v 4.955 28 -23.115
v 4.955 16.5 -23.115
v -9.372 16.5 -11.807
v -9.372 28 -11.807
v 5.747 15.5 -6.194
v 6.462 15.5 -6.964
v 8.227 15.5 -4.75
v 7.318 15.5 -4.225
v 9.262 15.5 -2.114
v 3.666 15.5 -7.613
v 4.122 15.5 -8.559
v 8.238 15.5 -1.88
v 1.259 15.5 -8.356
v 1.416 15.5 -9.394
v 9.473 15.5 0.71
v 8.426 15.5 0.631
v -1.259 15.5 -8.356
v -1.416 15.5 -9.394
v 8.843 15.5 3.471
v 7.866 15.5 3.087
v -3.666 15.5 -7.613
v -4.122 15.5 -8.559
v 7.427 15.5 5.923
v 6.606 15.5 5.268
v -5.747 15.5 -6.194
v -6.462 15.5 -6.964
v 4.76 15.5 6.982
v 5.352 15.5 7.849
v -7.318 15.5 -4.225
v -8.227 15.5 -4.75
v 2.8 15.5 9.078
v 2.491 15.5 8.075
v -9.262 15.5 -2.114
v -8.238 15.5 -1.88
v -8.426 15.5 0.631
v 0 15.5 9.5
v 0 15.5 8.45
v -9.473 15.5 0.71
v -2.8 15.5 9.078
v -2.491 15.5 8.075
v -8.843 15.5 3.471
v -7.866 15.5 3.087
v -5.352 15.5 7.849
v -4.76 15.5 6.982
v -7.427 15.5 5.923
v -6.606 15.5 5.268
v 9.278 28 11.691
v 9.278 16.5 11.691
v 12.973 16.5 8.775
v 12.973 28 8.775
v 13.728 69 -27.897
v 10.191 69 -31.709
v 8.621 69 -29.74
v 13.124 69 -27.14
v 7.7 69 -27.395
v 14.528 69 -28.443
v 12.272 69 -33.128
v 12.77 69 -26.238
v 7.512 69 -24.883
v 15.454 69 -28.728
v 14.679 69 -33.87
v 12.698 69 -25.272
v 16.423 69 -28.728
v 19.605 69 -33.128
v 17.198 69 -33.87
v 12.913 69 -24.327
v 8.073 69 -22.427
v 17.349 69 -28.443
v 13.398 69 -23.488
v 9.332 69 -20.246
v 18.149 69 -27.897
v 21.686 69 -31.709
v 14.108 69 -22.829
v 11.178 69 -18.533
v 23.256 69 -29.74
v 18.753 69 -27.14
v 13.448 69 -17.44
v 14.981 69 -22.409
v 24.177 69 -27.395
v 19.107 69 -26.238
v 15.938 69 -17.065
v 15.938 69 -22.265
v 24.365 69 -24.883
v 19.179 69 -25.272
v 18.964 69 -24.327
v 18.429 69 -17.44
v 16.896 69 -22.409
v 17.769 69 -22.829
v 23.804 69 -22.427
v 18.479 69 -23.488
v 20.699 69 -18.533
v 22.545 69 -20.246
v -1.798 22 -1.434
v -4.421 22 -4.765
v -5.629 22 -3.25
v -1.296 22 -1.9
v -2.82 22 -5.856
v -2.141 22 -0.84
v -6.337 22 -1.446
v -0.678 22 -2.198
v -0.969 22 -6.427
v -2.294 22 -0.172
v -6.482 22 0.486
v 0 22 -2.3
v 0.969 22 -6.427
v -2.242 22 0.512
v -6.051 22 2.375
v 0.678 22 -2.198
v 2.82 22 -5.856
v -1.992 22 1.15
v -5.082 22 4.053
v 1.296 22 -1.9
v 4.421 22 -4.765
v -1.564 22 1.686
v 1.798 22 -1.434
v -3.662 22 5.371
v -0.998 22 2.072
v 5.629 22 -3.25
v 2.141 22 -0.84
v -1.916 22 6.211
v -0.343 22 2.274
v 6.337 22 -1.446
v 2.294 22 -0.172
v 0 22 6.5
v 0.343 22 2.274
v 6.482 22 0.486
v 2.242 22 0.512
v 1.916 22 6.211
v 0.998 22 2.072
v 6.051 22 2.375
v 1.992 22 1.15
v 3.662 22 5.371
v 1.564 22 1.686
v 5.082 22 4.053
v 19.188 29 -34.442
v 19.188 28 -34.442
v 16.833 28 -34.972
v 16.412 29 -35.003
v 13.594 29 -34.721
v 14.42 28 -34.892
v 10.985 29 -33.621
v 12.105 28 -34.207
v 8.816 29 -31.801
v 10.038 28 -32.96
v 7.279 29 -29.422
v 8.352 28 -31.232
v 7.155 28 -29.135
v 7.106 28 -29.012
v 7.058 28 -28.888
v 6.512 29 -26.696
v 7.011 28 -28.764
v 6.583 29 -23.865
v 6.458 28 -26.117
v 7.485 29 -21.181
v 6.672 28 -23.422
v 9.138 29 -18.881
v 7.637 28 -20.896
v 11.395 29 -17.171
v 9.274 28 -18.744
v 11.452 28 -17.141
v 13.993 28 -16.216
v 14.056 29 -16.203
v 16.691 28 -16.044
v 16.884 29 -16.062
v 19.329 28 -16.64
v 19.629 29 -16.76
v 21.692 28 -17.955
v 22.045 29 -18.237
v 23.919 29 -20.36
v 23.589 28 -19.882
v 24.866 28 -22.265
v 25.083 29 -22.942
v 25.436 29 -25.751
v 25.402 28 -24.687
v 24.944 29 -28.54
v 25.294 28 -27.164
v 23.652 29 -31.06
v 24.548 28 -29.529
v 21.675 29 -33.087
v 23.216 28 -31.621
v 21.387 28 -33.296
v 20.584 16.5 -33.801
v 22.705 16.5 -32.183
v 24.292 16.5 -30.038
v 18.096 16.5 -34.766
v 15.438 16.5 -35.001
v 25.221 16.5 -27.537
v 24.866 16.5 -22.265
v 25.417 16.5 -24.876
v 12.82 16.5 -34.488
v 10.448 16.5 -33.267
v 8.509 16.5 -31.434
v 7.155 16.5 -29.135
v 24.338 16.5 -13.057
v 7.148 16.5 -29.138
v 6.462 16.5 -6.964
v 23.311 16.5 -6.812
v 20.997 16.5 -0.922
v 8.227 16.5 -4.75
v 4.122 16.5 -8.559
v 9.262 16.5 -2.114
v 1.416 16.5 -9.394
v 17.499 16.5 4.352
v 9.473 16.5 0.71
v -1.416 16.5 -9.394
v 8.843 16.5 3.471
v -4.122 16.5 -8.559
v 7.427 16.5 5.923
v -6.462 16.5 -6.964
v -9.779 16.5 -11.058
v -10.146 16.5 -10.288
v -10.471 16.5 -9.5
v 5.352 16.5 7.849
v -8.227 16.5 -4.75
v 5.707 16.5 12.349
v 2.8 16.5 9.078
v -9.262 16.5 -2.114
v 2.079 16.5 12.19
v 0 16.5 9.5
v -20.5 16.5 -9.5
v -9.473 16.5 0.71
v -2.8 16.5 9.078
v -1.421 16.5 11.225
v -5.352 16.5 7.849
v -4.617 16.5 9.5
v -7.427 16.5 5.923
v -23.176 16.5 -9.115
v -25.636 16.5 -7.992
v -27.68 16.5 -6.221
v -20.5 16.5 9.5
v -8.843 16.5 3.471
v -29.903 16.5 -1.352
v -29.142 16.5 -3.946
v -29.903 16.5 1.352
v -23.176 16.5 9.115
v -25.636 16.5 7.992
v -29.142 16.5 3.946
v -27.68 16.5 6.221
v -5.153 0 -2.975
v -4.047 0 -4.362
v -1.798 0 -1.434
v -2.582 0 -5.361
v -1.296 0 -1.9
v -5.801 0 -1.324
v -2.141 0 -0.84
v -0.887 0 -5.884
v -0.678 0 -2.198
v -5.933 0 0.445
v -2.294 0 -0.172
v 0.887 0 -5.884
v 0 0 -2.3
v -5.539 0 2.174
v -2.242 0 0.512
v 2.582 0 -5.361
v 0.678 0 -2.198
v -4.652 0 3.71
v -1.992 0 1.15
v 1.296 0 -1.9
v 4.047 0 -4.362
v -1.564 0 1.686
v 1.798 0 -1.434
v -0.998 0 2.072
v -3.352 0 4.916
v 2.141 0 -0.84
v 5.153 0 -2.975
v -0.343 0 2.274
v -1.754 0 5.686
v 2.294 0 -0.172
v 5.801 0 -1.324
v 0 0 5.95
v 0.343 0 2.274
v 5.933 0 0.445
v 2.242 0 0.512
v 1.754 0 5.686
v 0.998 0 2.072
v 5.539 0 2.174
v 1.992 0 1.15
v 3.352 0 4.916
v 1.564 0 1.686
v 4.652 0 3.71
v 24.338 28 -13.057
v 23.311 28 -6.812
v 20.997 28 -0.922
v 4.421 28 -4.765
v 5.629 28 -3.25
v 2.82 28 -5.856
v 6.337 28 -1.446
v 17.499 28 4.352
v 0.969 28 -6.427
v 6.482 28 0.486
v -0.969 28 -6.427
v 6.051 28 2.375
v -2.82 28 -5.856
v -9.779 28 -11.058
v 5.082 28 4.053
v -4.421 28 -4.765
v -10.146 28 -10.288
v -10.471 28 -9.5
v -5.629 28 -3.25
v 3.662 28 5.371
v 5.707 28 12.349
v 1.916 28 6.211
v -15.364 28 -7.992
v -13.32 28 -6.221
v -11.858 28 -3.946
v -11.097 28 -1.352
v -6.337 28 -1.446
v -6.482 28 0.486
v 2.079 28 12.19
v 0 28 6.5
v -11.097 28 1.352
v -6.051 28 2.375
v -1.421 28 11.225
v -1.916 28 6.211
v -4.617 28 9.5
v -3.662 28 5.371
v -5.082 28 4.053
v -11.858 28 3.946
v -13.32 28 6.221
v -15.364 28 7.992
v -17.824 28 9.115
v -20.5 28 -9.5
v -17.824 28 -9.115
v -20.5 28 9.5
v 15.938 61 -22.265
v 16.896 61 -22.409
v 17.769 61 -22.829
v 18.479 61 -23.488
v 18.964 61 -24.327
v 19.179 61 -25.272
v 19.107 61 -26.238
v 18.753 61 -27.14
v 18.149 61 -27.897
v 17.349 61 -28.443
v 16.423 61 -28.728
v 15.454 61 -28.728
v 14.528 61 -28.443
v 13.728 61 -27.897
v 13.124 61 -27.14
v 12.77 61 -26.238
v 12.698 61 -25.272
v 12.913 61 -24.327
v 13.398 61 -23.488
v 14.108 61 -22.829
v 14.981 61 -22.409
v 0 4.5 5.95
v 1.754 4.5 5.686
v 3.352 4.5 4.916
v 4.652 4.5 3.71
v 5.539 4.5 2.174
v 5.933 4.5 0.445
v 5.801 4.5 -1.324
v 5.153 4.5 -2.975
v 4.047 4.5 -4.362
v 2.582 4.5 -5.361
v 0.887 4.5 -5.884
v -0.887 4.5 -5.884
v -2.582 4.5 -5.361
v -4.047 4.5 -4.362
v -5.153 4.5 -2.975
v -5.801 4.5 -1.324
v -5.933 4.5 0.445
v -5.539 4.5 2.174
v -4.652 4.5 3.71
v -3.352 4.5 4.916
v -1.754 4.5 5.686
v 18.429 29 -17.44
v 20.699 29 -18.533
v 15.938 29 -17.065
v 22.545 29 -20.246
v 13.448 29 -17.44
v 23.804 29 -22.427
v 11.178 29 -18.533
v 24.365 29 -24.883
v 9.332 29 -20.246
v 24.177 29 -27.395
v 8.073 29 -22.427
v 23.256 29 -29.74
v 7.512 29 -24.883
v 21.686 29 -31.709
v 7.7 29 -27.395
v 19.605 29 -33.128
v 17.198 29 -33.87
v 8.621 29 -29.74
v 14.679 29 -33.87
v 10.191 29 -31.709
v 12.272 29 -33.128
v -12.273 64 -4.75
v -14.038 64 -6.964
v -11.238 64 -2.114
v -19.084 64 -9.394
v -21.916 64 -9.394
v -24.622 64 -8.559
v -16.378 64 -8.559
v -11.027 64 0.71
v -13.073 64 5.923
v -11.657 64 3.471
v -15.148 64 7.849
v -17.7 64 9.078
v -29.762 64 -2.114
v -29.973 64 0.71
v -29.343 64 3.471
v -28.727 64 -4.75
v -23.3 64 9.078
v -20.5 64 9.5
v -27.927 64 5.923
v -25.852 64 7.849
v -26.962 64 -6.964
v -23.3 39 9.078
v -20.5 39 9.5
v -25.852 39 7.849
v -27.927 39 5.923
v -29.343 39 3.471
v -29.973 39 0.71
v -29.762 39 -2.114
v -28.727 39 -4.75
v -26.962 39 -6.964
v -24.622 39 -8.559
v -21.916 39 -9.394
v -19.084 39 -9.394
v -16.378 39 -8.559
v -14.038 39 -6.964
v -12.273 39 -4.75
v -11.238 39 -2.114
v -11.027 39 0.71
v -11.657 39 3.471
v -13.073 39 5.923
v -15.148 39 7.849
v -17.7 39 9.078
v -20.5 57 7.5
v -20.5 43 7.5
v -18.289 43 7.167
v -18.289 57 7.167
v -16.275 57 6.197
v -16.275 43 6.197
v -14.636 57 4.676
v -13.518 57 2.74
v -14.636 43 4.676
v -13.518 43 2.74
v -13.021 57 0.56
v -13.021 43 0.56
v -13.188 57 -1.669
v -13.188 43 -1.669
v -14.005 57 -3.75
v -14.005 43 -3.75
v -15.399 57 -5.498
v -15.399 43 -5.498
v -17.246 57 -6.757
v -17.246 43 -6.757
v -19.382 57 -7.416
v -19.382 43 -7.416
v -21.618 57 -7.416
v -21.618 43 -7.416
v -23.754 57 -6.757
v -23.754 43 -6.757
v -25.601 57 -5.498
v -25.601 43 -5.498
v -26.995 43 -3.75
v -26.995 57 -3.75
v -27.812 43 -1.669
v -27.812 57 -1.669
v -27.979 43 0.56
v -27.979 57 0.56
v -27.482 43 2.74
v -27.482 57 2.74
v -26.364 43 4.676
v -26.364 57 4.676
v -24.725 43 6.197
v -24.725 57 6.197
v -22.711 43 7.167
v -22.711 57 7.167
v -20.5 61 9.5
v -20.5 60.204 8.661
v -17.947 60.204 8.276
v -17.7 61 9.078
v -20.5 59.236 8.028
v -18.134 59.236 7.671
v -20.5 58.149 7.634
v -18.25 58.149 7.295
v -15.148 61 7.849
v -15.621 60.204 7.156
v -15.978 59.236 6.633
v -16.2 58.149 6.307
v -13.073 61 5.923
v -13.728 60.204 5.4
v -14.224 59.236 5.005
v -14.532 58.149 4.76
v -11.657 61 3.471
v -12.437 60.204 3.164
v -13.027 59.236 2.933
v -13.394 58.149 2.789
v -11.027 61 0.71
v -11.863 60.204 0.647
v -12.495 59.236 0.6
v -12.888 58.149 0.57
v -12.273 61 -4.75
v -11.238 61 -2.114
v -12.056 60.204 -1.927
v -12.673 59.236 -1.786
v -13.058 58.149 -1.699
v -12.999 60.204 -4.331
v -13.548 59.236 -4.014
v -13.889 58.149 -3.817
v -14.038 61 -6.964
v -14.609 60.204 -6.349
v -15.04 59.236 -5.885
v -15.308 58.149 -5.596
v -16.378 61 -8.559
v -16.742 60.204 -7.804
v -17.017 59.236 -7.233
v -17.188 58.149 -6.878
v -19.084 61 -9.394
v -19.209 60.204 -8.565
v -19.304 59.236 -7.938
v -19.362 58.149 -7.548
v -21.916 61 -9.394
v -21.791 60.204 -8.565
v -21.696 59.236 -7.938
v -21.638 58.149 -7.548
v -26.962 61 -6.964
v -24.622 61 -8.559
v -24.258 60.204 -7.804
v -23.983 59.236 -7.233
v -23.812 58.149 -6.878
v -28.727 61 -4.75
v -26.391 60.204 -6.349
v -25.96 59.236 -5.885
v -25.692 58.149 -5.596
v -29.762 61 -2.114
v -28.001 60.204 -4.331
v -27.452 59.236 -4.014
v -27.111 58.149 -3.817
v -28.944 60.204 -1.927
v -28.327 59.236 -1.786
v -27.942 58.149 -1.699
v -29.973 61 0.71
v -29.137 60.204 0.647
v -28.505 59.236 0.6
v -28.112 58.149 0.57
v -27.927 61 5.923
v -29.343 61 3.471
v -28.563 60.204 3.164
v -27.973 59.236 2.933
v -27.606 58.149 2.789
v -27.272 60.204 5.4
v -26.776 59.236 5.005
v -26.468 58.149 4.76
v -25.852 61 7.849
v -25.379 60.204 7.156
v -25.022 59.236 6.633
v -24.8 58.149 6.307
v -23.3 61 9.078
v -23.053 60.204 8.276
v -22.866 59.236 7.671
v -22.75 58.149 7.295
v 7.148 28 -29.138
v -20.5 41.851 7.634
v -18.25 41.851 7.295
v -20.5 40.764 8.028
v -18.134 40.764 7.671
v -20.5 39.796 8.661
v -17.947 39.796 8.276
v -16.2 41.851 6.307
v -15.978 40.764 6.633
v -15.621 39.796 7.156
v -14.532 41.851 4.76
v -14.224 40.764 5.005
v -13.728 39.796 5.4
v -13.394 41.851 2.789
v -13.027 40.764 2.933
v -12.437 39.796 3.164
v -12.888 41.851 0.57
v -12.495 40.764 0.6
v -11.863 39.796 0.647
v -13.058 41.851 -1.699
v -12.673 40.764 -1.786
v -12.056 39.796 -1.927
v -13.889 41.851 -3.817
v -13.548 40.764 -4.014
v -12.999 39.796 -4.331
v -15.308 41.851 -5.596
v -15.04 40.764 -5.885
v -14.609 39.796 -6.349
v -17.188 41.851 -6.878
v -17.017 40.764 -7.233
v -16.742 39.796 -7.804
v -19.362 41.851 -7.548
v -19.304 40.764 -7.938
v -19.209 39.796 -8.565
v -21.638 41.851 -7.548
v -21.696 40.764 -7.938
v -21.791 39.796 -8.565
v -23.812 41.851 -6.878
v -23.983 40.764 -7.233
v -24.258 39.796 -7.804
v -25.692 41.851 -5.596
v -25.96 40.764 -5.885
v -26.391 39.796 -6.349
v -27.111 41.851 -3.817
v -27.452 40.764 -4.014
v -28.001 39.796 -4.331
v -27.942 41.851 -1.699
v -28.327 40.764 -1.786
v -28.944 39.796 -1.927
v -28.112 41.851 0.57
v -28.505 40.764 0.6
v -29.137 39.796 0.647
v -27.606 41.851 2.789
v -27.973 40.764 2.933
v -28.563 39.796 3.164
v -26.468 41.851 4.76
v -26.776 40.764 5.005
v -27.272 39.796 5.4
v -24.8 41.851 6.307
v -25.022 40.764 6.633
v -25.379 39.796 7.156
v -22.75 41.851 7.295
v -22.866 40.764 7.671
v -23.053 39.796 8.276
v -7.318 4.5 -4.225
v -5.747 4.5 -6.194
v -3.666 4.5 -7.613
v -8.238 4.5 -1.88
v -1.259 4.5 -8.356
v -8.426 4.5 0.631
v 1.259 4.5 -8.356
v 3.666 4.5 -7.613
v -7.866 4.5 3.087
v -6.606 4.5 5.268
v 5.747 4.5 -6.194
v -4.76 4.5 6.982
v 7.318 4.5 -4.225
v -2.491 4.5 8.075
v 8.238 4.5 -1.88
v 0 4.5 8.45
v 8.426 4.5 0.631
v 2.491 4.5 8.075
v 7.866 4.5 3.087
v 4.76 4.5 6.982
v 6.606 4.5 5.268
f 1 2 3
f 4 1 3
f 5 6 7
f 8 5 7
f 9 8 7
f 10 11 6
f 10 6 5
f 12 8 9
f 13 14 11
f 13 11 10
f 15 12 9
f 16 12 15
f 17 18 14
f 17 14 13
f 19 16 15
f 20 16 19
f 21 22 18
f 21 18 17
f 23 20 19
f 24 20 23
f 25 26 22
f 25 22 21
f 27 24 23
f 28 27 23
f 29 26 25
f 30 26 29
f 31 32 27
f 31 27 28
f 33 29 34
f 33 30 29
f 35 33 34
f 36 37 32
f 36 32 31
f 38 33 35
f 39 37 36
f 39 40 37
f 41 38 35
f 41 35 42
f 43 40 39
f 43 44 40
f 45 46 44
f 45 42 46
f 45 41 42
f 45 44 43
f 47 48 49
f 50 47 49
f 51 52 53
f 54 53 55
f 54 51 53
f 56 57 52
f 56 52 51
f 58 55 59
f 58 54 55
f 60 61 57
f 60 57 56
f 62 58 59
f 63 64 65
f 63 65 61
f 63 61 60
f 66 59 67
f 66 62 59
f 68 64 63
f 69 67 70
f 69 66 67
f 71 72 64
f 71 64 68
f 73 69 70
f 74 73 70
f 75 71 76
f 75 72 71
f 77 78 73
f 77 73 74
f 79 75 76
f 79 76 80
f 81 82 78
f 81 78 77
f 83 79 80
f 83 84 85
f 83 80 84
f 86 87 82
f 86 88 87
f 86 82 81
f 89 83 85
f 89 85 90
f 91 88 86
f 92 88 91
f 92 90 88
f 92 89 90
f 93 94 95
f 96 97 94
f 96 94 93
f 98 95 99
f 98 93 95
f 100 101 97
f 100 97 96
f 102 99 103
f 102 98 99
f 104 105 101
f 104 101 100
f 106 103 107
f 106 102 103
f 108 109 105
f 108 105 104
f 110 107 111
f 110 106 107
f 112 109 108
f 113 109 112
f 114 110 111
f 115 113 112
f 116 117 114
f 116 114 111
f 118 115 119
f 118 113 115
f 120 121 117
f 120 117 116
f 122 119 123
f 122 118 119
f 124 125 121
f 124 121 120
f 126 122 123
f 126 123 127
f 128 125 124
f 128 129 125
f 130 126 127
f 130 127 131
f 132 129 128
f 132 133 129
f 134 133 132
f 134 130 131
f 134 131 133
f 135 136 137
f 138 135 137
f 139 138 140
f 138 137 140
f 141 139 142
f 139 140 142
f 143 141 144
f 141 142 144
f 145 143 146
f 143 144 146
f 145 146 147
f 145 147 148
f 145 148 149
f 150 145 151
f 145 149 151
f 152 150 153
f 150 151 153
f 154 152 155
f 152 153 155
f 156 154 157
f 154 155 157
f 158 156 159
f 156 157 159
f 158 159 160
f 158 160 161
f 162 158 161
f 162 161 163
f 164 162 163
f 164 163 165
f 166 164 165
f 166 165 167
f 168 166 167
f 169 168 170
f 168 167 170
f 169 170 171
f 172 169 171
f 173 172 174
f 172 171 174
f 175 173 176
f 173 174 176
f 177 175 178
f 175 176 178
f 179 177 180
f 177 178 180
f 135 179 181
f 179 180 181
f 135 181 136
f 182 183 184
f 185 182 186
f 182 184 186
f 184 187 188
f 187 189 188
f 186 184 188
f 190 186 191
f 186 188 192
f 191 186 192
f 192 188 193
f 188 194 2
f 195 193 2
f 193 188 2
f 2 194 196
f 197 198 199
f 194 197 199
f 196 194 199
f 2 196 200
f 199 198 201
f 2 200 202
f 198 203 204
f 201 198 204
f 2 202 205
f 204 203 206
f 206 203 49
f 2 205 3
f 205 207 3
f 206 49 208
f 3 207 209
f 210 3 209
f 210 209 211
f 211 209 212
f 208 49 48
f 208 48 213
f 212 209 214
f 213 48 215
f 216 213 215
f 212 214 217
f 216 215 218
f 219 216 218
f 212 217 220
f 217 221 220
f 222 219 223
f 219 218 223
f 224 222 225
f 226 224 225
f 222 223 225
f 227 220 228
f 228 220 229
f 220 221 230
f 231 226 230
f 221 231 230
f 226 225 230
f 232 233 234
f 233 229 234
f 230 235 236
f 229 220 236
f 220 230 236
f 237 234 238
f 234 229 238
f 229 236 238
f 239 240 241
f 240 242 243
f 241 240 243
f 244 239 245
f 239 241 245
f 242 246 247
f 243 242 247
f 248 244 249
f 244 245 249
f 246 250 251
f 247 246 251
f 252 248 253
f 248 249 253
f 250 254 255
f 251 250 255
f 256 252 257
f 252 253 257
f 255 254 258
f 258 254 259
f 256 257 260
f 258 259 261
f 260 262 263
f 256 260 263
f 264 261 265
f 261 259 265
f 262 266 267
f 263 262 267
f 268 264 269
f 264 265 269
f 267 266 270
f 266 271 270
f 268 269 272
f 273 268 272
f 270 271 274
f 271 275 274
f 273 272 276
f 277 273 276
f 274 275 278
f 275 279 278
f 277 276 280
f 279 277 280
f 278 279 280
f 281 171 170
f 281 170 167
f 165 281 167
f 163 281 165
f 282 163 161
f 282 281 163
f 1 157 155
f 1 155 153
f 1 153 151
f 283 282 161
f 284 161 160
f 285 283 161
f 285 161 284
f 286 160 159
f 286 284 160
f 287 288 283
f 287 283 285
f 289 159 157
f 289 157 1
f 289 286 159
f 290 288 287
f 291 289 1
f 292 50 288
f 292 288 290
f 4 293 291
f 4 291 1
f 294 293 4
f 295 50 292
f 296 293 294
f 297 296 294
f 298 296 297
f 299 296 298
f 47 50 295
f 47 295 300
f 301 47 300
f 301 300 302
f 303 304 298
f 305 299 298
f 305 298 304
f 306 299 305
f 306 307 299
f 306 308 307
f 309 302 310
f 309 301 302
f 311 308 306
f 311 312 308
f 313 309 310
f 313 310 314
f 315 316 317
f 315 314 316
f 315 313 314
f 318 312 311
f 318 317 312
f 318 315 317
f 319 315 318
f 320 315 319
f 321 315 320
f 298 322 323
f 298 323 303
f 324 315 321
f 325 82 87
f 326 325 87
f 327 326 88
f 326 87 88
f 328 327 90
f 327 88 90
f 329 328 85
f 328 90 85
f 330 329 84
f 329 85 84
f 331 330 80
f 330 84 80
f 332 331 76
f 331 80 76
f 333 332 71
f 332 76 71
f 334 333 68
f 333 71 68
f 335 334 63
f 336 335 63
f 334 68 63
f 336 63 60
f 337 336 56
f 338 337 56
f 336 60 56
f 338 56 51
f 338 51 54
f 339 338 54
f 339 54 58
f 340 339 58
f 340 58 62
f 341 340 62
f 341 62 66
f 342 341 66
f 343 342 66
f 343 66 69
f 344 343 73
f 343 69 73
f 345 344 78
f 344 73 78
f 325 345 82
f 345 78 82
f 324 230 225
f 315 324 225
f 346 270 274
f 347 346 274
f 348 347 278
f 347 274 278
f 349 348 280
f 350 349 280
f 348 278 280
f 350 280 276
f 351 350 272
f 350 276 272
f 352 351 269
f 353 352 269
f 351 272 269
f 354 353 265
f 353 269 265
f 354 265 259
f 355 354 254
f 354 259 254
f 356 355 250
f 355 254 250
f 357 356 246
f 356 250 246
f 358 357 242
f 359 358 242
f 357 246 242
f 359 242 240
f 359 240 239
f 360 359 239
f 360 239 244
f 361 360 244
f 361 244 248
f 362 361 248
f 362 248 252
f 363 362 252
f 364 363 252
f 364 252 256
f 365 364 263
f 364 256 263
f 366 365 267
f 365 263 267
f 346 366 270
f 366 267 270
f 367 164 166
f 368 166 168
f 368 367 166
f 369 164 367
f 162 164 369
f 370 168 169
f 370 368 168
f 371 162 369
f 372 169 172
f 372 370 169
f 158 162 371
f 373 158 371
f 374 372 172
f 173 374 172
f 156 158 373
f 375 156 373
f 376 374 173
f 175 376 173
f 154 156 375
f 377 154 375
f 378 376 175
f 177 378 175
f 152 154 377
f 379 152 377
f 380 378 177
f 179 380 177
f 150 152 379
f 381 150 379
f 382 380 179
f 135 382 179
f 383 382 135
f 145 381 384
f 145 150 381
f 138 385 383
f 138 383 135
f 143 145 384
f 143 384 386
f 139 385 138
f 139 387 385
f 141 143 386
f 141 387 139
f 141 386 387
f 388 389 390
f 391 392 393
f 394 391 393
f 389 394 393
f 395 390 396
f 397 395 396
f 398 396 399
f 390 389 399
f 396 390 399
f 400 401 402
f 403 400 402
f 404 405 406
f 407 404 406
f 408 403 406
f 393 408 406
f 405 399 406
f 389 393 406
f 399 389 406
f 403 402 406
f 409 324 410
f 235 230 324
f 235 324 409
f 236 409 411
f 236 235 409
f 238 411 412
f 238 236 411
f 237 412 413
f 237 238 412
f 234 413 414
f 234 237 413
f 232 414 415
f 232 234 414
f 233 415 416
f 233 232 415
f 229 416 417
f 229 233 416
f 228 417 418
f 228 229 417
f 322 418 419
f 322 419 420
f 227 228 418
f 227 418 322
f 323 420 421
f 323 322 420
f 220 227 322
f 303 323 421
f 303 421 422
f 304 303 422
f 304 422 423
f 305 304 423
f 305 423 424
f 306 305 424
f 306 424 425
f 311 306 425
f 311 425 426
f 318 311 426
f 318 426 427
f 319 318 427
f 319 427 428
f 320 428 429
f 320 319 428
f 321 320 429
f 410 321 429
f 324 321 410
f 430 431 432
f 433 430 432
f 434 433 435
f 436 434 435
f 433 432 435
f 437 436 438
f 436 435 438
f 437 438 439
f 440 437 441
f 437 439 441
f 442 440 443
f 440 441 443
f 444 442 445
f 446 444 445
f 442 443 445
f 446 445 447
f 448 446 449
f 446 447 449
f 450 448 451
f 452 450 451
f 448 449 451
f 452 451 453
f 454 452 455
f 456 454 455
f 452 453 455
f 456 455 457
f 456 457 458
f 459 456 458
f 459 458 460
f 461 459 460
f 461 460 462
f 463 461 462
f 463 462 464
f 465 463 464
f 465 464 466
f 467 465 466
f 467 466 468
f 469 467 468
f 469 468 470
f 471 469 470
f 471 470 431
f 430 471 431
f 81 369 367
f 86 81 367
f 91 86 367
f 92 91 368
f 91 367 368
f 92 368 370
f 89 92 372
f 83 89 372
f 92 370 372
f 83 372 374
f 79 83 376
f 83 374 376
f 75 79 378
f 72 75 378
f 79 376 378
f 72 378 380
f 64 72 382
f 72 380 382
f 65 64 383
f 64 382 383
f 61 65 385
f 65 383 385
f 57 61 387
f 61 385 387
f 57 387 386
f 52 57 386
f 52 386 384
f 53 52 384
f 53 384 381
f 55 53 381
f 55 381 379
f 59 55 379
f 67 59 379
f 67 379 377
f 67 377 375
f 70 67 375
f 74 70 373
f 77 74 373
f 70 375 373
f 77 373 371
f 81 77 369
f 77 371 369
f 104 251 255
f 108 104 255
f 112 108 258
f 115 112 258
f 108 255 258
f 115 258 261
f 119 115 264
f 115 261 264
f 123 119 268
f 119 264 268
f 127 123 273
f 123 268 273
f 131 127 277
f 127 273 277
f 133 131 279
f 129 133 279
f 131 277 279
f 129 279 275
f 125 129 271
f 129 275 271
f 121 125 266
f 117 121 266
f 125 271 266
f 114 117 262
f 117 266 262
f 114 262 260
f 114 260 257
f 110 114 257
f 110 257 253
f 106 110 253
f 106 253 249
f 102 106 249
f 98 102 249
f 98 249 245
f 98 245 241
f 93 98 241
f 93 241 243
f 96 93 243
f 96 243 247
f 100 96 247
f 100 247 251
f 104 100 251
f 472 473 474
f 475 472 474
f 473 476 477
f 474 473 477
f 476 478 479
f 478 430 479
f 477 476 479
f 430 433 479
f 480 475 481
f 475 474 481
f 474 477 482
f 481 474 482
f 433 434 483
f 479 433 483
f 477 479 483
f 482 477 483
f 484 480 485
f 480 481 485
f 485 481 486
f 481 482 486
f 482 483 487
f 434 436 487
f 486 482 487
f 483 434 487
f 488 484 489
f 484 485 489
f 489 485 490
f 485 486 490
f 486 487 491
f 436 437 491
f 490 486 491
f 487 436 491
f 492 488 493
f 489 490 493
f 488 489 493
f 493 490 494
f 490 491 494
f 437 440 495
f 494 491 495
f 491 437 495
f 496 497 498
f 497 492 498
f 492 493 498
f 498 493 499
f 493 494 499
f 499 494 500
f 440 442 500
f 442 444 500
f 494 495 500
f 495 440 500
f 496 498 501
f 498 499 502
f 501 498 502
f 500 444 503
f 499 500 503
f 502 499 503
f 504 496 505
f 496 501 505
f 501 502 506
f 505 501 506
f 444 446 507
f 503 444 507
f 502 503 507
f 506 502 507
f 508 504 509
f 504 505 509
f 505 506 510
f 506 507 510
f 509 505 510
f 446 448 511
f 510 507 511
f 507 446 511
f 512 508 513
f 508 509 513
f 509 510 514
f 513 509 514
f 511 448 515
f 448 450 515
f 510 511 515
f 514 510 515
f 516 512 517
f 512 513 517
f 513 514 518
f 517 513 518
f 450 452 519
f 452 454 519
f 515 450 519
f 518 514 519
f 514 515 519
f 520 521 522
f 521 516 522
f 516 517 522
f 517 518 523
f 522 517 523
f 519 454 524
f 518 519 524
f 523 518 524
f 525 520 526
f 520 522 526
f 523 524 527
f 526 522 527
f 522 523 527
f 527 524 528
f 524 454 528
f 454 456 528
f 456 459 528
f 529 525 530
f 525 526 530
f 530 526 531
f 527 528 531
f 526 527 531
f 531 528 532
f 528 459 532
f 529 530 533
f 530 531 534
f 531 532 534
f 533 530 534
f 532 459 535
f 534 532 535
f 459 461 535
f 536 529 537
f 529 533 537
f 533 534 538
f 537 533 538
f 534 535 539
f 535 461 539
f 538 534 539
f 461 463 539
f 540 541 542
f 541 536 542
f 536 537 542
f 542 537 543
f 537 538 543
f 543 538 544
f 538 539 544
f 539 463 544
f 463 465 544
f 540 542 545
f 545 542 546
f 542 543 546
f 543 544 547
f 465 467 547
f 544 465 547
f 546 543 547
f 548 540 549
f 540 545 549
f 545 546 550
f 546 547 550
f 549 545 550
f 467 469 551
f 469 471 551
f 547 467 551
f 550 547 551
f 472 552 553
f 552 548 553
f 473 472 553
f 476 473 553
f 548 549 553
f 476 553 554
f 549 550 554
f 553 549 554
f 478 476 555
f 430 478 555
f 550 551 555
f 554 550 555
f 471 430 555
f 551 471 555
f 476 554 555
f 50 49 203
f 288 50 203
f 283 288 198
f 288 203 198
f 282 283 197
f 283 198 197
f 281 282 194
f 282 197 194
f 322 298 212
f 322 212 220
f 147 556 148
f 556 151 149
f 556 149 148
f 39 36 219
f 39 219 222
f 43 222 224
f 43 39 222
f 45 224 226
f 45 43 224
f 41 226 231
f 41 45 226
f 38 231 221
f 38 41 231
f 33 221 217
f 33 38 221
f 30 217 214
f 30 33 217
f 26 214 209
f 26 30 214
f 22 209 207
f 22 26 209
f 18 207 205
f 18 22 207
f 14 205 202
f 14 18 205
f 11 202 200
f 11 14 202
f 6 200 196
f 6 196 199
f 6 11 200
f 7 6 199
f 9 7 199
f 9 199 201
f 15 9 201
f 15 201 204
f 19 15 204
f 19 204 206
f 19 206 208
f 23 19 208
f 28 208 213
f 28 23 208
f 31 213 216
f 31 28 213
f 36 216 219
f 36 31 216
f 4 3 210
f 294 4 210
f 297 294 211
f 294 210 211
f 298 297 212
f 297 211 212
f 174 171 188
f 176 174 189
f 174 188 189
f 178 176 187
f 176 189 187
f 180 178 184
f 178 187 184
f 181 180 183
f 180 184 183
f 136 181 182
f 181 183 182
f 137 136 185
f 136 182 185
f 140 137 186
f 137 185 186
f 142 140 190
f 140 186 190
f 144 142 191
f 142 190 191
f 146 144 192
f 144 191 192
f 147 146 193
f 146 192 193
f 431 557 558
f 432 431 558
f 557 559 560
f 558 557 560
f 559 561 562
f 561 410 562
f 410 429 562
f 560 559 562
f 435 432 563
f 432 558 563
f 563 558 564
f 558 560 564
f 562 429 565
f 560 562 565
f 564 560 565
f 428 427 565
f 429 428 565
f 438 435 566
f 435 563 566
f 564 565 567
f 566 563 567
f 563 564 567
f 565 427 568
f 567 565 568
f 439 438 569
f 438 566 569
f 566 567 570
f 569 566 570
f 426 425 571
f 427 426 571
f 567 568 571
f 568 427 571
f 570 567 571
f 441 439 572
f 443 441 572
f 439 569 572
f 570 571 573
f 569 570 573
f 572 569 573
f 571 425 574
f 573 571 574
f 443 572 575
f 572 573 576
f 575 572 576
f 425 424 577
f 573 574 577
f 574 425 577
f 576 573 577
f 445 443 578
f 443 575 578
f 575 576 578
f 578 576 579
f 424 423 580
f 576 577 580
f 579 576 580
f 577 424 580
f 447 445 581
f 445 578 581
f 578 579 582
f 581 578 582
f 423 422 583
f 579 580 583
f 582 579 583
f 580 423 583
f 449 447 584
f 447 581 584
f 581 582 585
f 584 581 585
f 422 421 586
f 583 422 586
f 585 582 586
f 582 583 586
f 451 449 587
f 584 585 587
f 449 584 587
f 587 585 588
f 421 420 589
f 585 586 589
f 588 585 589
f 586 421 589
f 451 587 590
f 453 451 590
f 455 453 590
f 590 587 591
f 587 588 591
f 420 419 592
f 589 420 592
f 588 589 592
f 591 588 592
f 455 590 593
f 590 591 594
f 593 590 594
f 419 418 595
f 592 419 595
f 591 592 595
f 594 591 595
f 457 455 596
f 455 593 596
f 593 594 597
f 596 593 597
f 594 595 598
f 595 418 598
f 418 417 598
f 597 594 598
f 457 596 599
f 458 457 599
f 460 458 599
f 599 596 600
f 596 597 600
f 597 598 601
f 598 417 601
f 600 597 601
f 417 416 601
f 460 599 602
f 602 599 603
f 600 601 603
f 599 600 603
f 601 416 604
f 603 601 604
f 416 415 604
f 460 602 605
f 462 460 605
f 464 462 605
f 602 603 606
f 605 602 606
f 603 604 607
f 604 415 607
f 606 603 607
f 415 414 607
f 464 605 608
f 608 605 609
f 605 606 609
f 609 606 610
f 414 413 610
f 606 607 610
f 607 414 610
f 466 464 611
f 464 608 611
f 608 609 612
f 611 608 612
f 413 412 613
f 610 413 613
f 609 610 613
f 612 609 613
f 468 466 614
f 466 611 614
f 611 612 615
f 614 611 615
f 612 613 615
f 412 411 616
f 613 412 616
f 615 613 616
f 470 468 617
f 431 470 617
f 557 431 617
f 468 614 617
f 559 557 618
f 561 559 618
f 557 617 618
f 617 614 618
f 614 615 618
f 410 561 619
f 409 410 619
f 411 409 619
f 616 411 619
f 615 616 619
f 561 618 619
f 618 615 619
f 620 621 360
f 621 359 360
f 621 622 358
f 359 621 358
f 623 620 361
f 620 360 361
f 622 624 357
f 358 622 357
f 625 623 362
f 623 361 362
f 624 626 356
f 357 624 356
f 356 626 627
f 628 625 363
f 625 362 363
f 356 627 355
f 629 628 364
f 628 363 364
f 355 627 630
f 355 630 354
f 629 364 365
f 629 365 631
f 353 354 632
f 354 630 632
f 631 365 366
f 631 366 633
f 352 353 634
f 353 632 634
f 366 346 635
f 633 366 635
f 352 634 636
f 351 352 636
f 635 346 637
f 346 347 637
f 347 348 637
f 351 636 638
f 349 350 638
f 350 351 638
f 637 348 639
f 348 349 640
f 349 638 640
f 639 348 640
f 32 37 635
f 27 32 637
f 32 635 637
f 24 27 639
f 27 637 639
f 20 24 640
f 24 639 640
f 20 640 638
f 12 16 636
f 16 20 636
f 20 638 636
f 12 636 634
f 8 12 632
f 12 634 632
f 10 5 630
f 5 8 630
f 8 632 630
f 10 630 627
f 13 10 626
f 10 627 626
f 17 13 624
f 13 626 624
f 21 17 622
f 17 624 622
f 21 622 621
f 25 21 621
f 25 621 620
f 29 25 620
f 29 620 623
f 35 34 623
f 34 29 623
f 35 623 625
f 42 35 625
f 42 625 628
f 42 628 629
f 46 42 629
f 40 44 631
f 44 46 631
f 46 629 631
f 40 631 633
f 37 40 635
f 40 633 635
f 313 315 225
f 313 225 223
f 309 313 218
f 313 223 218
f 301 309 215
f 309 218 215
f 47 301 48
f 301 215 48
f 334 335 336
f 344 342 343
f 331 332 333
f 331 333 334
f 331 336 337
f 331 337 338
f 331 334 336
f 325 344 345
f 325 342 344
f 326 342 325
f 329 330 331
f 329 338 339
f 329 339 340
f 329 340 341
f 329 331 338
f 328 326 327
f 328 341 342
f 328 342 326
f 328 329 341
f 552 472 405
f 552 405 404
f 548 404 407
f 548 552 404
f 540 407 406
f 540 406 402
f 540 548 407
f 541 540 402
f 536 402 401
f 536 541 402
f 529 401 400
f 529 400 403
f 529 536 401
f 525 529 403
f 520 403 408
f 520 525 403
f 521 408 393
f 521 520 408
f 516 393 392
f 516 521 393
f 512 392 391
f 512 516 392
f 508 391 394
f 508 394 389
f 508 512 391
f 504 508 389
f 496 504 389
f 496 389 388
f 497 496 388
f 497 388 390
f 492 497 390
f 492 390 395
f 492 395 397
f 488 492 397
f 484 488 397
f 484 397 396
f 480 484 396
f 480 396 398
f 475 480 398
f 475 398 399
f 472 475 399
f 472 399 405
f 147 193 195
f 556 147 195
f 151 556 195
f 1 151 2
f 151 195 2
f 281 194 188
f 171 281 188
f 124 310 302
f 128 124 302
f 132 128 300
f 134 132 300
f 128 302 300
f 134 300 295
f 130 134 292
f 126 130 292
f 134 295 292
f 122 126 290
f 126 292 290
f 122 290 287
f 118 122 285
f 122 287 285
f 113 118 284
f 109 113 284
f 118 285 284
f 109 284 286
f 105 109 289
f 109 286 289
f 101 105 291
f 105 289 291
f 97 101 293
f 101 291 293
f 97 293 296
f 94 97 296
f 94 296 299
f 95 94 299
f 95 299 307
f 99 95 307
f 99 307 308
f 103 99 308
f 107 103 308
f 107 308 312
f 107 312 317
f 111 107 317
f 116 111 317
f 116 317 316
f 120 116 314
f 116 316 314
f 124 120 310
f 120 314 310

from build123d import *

# Parameters (mm, degrees)
SKETCH_1_R           = 5.95
EXTRUDE_1_DEPTH      = 4.5
SKETCH_4_R           = 8.45
EXTRUDE_4_DEPTH      = 17.75
EXTRUDE_6_DEPTH      = 5.75
EXTRUDE_6_DEPTH_BACK = 5.75
SKETCH_12_R          = 9.5
EXTRUDE_10_DEPTH     = 1
SKETCH_7_R           = 2.3
CUT_EXTRUDE_1_DEPTH  = 57.22806055
SKETCH_8_R           = 6.5
CUT_EXTRUDE_2_DEPTH  = 6
SKETCH_9_R           = 9.5
EXTRUDE_7_DEPTH      = 36
SKETCH_10_R          = 8.45
EXTRUDE_8_DEPTH      = 40
EXTRUDE_START        = 1
SKETCH_13_R          = 9.5
SKETCH_13_R_2        = 2.3
EXTRUDE_11_DEPTH     = 1
SKETCH_14_R          = 3.25
CUT_EXTRUDE_3_DEPTH  = 8
CUT_EXTRUDE_START    = -18
CUT_EXTRUDE_4_DEPTH  = 18
CUT_EXTRUDE_START_2  = 11
SKETCH_16_R          = 14.956390748
SKETCH_16_R_2        = 7.5
CUT_EXTRUDE_5_DEPTH  = 22
FILLET_2_R           = 5
SKETCH_18_R          = 7.5
EXTRUDE_12_DEPTH     = 11.5


with BuildPart() as part:
    # Эскиз1 → Бобышка-Вытянуть1 (new body)
    with BuildSketch(Plane(origin=(0, 0, 0), x_dir=(1, 0, 0), z_dir=(0, 1, 0))):
        with Locations(Location((0, 0, 0), (0, 0, 270))):
            Circle(SKETCH_1_R)
    extrude(amount=EXTRUDE_1_DEPTH)

    # Эскиз4 → Бобышка-Вытянуть4 (add)
    with BuildSketch(Plane(origin=(0, 4.5, 0), x_dir=(1, 0, 0), z_dir=(0, 1, 0))):
        with Locations(Location((0, 0, 0), (0, 0, 270))):
            Circle(SKETCH_4_R)
    extrude(amount=EXTRUDE_4_DEPTH)

    # Эскиз6 → Бобышка-Вытянуть6 (add, two sides: drawn at the far end of the back side and taken through both)
    with BuildSketch(Plane(origin=(0, 22.25, 0), x_dir=(1, 0, 0), z_dir=(0, 1, 0)).offset(-EXTRUDE_6_DEPTH_BACK)):
        with BuildLine():
            Line((-7.002075382, 9.5), (-30, 9.5))
            Line((-30, 9.5), (-30, -9.5))
            Line((-30, -9.5), (0, -9.5))
            Line((0, -9.5), (0.833655922, -9.5))
            ThreePointArc((0.833655922, -9.5), (3.331132848, -9.18310947), (5.670324417, -8.252521801))
            ThreePointArc((5.670324417, -8.252521801), (13.556905273, -2.05094269), (19.066851837, 6.333461279))
            Line((19.066851837, 6.333461279), (28.114764095, 31.1923959))
            Line((28.114764095, 31.1923959), (10.2606043, 37.690778624))
            Line((10.2606043, 37.690778624), (2.394850826, 16.079798567))
            ThreePointArc((2.394850826, 16.079798567), (-1.266311019, 11.308479557), (-7.002075382, 9.5))
        make_face()
    extrude(amount=EXTRUDE_6_DEPTH + EXTRUDE_6_DEPTH_BACK)

    # Эскиз12 → Бобышка-Вытянуть10 (add)
    with BuildSketch(Plane(origin=(0, 28, 0), x_dir=(1, 0, 0), z_dir=(0, 1, 0))):
        with Locations(Location((15.938492836, 25.514507365, 0), (0, 0, 70))):
            Circle(SKETCH_12_R)
    extrude(amount=EXTRUDE_10_DEPTH)

    # Эскиз7 → Вырез-Вытянуть1 (cut, through all)
    with BuildSketch(Plane.XZ):
        with Locations(Location((0, 0, 0), (0, 0, 270))):
            Circle(SKETCH_7_R)
    extrude(amount=-CUT_EXTRUDE_1_DEPTH, mode=Mode.SUBTRACT)

    # Эскиз8 → Вырез-Вытянуть2 (cut)
    with BuildSketch(Plane(origin=(0, 28, 0), x_dir=(1, 0, 0), z_dir=(0, 1, 0))):
        with Locations(Location((0, 0, 0), (0, 0, 270))):
            Circle(SKETCH_8_R)
    extrude(amount=-CUT_EXTRUDE_2_DEPTH, mode=Mode.SUBTRACT)

    # Эскиз9 → Бобышка-Вытянуть7 (add)
    with BuildSketch(Plane.XZ.offset(-28)):
        with Locations(Location((-20.5, 0, 0), (0, 0, 90))):
            Circle(SKETCH_9_R)
    extrude(amount=-EXTRUDE_7_DEPTH)

    # Эскиз10 → Бобышка-Вытянуть8 (add)
    with BuildSketch(Plane(origin=(0, 29, 0), x_dir=(1, 0, 0), z_dir=(0, 1, 0))):
        with Locations(Location((15.938492836, 25.514507365, 0), (0, 0, 270))):
            Circle(SKETCH_10_R)
    extrude(amount=EXTRUDE_8_DEPTH)

    # Эскиз13 → Бобышка-Вытянуть11 (add)
    with BuildSketch(Plane.XZ.offset(-16.5).offset(EXTRUDE_START)):
        with Locations(Location((0, 0, 0), (0, 0, 90))):
            Circle(SKETCH_13_R)
        with Locations(Location((0, 0, 0), (0, 0, 270))):
            Circle(SKETCH_13_R_2, mode=Mode.SUBTRACT)
    extrude(amount=-EXTRUDE_11_DEPTH)

    # Эскиз14 → Вырез-Вытянуть3 (cut)
    with BuildSketch(Plane(origin=(0, 69, 0), x_dir=(1, 0, 0), z_dir=(0, 1, 0))):
        with Locations(Location((15.938492836, 25.514507365, 0), (0, 0, 270))):
            Circle(SKETCH_14_R)
    extrude(amount=-CUT_EXTRUDE_3_DEPTH, mode=Mode.SUBTRACT)

    # Эскиз15 → Вырез-Вытянуть4 (cut)
    with BuildSketch(Plane(origin=(0, 28, 0), x_dir=(1, 0, 0), z_dir=(0, 1, 0)).offset(CUT_EXTRUDE_START)):
        with BuildLine():
            Line((-20.5, 9.5), (-20.5, 16.947416375))
            Line((-20.5, 16.947416375), (-42.12929037, 16.947416375))
            Line((-42.12929037, 16.947416375), (-42.12929037, -12.742276146))
            Line((-42.12929037, -12.742276146), (-20.5, -12.742276146))
            Line((-20.5, -12.742276146), (-20.5, -9.5))
            ThreePointArc((-20.5, -9.5), (-30, 0), (-20.5, 9.5))
        make_face()
        with BuildLine():
            Line((7.155380289, 29.134857346), (-1.255186481, 32.601646037))
            Line((-1.255186481, 32.601646037), (4.631093303, 46.881994095))
            Line((4.631093303, 46.881994095), (38.784745505, 32.804049238))
            Line((38.784745505, 32.804049238), (32.89846572, 18.523701179))
            Line((32.89846572, 18.523701179), (24.721605383, 21.894157383))
            ThreePointArc((24.721605383, 21.894157383), (19.558842817, 34.297619911), (7.155380289, 29.134857346))
        make_face()
    extrude(amount=CUT_EXTRUDE_4_DEPTH, mode=Mode.SUBTRACT)

    # Эскиз16 → Вырез-Вытянуть5 (cut)
    with BuildSketch(Plane(origin=(0, 28, 0), x_dir=(1, 0, 0), z_dir=(0, 1, 0)).offset(CUT_EXTRUDE_START_2)):
        with Locations((-20.5, 0)):
            Circle(SKETCH_16_R)
        with Locations(Location((-20.5, 0, 0), (0, 0, 270))):
            Circle(SKETCH_16_R_2, mode=Mode.SUBTRACT)
    extrude(amount=CUT_EXTRUDE_5_DEPTH, mode=Mode.SUBTRACT)

    # Скругление2
    # the kernel refuses this fillet: 5 mm, written as the material it adds along each edge
    with BuildSketch(Plane(origin=(-20.5, 39, 0), x_dir=(0, 0, 1), z_dir=(-1, 0, 0))) as fillet_2_piece_1:
        with BuildLine():
            CenterArc((12.5, 4), FILLET_2_R, 180, 53.130102354)
            Line((7.5, 4), (7.4, 4))
            Line((7.4, 4), (7.4, 0))
            Line((7.4, 0), (7.5, -0.1))
            ThreePointArc((7.5, -0.1), (8.5, -0.1), (9.44, -0.08))
            Line((9.44, -0.08), (9.5, 0))
        make_face()
    revolve(axis=Axis((-20.5, 39, 0), (0, 1, 0)))
    with BuildSketch(Plane(origin=(-20.5, 61, 0), x_dir=(0, 0, 1), z_dir=(-1, 0, 0))) as fillet_2_piece_2:
        with BuildLine():
            CenterArc((12.5, -4), FILLET_2_R, 126.869897646, 53.130102354)
            Line((9.5, 0), (9.44, 0.08))
            ThreePointArc((9.44, 0.08), (8.5, 0.1), (7.5, 0.1))
            Line((7.5, 0.1), (7.4, 0))
            Line((7.4, 0), (7.4, -4))
            Line((7.4, -4), (7.5, -4))
        make_face()
    revolve(axis=Axis((-20.5, 61, 0), (0, 1, 0)))

    # Эскиз18 → Бобышка-Вытянуть12 (add)
    with BuildSketch(Plane.XZ.offset(-16.5)):
        with BuildLine():
            Line((9.278482036, 11.69085434), (12.972576627, 8.775389277))
            ThreePointArc((12.972576627, 8.775389277), (20.997261978, -0.921608959), (24.337711873, -13.057042378))
            Line((24.337711873, -13.057042378), (24.865572733, -22.265316003))
            Line((24.865572733, -22.265316003), (5.413533881, -23.476451416))
            Line((5.413533881, -23.476451416), (-9.371872764, -11.807465836))
            ThreePointArc((-9.371872764, -11.807465836), (-8.040562687, 6.286337643), (9.278482036, 11.69085434))
        make_face()
        Circle(SKETCH_18_R, mode=Mode.SUBTRACT)
    extrude(amount=-EXTRUDE_12_DEPTH)


solid = part.part
